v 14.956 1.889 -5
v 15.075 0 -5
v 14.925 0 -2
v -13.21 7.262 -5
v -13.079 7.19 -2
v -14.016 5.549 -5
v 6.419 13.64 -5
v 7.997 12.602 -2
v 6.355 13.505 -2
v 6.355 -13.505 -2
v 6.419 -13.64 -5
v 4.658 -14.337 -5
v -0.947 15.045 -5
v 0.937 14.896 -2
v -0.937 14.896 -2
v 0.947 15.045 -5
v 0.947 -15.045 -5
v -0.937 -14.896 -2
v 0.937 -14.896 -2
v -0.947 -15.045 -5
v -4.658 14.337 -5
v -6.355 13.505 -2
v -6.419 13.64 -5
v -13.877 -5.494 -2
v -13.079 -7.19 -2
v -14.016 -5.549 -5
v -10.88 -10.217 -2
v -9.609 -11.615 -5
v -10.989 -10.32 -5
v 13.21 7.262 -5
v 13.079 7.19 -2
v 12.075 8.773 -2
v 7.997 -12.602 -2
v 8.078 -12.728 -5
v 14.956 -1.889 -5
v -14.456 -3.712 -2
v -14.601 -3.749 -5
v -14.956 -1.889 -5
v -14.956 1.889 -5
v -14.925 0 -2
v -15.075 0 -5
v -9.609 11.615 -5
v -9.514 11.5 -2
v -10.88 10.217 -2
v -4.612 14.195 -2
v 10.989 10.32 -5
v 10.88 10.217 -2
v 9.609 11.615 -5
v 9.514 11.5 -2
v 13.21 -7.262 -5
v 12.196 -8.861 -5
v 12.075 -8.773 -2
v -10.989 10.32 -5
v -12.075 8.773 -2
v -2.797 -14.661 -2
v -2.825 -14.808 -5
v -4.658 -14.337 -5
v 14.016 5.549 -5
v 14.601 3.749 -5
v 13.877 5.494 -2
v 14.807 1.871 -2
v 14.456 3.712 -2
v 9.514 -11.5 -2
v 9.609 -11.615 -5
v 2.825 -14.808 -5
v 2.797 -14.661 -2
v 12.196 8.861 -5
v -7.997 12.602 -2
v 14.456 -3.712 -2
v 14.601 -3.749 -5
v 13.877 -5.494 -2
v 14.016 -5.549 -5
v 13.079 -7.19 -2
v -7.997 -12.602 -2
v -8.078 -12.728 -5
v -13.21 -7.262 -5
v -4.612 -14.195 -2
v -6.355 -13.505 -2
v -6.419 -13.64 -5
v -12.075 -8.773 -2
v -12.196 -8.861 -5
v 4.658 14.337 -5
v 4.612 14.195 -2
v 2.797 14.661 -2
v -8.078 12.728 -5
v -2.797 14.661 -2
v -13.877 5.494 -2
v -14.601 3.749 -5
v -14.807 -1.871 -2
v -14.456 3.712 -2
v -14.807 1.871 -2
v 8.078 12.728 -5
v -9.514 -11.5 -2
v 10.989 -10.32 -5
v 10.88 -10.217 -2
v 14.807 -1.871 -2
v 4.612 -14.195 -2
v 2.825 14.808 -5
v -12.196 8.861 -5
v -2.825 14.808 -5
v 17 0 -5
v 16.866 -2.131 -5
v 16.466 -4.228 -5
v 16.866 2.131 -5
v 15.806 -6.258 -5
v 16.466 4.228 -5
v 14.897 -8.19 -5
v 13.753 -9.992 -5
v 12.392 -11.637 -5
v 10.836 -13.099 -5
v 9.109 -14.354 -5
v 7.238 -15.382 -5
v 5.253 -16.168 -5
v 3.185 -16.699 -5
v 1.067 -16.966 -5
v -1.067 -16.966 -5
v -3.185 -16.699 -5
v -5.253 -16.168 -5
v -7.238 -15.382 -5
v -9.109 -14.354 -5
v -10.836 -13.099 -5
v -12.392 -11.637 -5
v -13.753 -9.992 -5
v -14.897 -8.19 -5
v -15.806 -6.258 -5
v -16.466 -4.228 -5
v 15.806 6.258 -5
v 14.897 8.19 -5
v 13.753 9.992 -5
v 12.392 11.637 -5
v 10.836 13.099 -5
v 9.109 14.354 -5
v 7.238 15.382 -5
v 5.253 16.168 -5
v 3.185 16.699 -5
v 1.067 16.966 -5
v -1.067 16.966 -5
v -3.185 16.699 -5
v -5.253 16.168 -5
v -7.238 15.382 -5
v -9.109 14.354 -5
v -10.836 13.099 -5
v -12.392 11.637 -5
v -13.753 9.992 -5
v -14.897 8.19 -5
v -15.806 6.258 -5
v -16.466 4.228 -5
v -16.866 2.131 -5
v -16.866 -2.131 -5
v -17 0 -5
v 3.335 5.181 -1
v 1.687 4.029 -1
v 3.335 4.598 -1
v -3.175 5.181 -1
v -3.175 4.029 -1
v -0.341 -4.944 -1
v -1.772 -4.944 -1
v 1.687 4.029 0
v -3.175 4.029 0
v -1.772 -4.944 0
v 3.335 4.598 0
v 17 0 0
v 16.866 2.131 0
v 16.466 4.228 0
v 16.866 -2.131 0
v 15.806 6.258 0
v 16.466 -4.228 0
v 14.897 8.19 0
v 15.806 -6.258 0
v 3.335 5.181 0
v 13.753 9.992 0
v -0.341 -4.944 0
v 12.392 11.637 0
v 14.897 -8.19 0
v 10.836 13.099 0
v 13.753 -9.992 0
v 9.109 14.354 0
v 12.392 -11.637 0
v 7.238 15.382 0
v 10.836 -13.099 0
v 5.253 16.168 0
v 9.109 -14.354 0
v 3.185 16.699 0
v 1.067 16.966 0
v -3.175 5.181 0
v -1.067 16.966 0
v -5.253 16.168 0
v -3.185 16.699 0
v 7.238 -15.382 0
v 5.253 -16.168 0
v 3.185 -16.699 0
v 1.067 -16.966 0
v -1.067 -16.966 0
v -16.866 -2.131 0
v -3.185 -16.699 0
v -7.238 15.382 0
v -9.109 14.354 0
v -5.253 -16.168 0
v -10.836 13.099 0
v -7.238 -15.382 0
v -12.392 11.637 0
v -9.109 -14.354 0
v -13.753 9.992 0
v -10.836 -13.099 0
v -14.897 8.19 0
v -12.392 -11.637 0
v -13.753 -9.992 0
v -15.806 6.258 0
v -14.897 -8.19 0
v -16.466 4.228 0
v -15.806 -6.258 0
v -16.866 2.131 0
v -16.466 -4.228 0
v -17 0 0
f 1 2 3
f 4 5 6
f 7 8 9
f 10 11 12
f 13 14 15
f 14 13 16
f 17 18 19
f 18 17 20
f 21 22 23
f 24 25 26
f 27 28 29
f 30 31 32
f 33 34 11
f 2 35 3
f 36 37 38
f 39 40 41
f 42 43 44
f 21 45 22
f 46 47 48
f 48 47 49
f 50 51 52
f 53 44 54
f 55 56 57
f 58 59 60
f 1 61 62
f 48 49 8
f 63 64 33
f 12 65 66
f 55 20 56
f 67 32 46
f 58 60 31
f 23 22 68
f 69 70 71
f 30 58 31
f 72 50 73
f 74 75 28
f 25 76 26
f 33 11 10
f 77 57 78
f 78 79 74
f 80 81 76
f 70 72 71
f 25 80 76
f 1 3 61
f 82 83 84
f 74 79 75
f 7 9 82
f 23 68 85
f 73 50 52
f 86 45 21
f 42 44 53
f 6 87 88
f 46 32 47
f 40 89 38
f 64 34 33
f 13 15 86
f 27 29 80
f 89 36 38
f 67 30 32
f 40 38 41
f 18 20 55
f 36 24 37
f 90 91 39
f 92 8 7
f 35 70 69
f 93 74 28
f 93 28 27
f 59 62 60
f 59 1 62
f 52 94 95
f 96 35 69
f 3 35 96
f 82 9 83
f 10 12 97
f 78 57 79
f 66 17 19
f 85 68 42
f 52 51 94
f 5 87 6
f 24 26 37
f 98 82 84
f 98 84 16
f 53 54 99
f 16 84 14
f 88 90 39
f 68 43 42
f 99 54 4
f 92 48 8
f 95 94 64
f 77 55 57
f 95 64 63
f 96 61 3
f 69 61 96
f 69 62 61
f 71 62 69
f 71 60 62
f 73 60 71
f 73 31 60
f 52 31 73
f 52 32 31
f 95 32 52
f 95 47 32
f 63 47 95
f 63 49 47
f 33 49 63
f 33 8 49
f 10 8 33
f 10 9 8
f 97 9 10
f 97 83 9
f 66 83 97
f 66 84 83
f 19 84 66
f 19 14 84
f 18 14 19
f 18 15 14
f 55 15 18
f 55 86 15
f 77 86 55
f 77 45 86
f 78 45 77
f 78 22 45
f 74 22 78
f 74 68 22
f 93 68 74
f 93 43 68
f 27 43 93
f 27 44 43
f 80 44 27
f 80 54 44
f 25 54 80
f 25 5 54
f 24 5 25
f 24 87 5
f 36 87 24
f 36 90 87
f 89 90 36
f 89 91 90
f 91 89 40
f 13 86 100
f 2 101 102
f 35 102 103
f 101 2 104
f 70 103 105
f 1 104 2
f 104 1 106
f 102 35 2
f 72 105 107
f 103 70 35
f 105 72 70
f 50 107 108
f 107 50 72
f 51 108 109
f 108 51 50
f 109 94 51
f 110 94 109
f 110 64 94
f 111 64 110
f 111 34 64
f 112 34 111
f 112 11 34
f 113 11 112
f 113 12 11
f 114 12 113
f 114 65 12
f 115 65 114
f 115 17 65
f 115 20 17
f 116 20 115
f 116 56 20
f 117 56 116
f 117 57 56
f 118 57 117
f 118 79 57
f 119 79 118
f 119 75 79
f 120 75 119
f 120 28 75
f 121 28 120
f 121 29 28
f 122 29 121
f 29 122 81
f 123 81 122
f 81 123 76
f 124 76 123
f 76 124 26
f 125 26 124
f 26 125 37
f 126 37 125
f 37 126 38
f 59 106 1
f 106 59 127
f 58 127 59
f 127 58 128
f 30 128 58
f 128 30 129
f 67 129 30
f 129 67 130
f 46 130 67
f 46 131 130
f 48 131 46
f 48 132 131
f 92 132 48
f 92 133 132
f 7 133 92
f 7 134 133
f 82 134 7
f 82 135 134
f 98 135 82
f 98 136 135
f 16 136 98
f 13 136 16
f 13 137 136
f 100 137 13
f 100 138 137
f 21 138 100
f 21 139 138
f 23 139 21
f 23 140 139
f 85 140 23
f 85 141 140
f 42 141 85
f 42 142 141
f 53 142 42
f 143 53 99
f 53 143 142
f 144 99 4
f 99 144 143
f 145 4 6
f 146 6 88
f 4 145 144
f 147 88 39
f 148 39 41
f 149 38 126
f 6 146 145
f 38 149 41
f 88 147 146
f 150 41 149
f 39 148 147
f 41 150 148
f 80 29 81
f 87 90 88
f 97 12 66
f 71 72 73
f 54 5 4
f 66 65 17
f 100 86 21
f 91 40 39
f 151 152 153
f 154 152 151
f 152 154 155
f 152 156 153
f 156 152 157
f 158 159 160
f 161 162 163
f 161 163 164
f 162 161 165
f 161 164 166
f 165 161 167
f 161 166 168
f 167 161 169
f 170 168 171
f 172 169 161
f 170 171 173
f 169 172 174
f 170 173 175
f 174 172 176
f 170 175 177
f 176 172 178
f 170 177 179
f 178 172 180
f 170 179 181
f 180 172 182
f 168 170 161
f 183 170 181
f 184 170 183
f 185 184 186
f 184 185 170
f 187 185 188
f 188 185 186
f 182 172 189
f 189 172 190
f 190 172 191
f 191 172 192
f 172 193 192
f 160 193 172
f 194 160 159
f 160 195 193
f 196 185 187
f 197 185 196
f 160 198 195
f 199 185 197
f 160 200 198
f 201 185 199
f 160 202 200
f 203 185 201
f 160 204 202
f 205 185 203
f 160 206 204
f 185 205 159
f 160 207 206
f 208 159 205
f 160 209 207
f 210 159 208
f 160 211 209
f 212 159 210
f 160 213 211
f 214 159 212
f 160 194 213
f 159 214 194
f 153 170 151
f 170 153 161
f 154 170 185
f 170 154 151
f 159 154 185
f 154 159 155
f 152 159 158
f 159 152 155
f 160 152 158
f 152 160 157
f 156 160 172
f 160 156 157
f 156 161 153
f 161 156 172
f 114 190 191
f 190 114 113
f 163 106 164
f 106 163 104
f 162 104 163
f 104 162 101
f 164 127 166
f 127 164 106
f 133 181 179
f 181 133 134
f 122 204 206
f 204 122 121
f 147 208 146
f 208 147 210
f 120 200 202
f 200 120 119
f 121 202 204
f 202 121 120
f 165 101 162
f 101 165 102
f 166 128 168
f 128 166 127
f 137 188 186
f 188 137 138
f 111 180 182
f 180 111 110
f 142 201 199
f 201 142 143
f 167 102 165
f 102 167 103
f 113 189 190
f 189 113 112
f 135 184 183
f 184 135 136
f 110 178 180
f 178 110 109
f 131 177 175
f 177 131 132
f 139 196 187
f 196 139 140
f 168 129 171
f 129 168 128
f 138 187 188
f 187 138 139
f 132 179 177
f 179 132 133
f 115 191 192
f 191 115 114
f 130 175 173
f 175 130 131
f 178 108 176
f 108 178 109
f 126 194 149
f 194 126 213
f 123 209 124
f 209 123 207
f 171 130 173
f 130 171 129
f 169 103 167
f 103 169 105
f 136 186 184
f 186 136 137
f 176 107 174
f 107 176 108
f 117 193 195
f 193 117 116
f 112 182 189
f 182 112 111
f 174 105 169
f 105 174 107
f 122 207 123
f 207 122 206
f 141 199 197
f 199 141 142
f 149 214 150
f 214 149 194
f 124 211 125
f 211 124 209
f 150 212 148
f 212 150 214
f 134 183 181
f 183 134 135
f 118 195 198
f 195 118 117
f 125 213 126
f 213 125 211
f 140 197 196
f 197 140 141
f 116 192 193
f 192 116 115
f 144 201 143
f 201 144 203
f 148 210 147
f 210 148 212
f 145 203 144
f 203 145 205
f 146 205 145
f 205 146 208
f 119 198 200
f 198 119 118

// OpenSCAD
$fn = 50;


difference() {
	union() {
		translate(v = [0, 0, -5.0000000000]) {
			cylinder(h = 5, r = 17.0000000000);
		}
	}
	union() {
		#translate(v = [0, 0, -5.0000000000]) {
			cylinder(h = 3, r1 = 15.0750000000, r2 = 14.9250000000);
		}
		translate(v = [0, 0, -1]) {
			linear_extrude(height = 1) {
				text(font = "Impact", halign = "center", size = 10, text = "7", valign = "center");
			}
		}
	}
}
